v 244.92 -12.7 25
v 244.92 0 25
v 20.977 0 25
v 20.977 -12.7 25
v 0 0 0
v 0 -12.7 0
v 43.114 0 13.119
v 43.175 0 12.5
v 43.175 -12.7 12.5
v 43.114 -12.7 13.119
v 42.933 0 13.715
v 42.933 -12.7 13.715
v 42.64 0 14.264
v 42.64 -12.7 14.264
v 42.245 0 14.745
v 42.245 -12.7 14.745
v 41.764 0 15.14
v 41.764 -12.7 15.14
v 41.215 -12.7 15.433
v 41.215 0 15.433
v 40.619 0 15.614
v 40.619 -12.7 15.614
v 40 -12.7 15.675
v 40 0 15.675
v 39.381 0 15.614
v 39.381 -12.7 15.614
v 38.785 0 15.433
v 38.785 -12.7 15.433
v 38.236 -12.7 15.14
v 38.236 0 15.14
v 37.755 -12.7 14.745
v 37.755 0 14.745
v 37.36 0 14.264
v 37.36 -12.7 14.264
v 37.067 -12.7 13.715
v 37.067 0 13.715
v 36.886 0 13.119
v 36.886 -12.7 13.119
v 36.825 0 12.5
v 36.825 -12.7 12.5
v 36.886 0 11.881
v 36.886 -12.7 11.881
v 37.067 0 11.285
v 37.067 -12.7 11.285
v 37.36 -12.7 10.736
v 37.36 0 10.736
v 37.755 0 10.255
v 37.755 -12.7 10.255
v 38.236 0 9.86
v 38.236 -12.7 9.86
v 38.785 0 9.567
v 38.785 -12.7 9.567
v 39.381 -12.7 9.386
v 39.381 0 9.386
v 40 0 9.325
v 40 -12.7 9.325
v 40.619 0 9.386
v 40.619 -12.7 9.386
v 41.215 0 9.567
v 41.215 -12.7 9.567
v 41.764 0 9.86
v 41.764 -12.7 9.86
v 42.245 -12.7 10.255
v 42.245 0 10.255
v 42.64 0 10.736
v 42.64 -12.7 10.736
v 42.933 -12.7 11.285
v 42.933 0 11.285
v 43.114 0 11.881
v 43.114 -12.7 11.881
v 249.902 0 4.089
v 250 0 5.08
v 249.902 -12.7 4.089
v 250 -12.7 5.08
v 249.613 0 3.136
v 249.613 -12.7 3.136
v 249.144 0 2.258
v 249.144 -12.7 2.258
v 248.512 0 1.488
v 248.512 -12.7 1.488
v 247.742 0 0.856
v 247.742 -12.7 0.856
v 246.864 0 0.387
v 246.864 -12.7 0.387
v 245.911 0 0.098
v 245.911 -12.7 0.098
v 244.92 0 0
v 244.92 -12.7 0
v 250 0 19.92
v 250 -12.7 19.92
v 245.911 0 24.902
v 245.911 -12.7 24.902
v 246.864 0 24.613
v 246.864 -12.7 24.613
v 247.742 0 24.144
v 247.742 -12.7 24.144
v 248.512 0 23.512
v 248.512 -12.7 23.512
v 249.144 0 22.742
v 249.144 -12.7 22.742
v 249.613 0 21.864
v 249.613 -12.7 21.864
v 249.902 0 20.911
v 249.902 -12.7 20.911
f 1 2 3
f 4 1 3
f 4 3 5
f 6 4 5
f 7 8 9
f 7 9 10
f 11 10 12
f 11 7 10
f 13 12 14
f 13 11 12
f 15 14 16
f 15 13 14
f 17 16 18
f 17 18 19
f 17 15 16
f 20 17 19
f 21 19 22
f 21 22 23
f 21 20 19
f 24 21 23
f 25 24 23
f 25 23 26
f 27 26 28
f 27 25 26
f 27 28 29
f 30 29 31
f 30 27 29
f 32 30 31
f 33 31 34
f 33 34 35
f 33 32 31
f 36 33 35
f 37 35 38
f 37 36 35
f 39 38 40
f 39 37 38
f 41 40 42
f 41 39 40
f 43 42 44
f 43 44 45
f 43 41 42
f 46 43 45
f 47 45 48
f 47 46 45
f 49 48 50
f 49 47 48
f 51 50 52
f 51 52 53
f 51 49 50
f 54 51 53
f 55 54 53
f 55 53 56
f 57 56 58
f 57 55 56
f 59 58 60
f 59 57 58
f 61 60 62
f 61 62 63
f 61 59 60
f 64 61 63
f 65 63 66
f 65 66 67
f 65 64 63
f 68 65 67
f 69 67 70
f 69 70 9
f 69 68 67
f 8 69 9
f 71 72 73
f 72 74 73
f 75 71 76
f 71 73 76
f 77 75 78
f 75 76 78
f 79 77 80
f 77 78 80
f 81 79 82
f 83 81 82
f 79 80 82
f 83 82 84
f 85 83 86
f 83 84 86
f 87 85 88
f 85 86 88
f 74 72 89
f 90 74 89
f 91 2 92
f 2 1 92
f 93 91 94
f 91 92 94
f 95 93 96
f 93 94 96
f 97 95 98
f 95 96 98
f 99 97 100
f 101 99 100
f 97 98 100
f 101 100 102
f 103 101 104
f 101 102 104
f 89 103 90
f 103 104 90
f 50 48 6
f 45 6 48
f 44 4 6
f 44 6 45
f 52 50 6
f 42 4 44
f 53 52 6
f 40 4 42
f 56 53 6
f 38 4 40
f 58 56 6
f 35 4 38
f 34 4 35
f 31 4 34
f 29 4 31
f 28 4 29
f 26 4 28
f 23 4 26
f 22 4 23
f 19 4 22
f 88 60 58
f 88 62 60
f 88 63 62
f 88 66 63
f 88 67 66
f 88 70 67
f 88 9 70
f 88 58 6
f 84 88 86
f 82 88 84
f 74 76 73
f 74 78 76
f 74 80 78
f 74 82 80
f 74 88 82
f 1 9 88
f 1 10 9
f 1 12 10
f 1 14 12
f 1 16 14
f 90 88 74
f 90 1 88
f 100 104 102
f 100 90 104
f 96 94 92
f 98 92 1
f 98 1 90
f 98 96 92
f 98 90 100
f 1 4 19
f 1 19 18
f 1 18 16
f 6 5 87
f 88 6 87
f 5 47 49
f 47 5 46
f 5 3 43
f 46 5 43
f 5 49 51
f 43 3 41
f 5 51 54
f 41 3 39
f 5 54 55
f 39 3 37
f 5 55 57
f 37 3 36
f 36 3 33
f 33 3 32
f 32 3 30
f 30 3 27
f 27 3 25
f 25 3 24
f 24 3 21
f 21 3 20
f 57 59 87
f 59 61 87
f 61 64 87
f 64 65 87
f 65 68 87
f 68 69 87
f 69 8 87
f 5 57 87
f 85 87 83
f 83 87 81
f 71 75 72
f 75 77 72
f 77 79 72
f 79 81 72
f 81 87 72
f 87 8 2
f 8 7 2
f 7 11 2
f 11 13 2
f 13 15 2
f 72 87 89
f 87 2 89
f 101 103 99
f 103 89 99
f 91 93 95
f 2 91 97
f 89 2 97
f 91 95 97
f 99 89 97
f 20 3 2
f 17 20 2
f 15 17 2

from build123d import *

# Parameters (mm, degrees)
F0_R     = 3.175
F1_DEPTH = 12.7
F2_R     = 5.08
F3_R     = 5.08


with BuildPart() as f1:
    # F0 (on Front) → F1 (new body)
    with BuildSketch(Plane.XZ):
        Polygon((20.977491, 25), (0, 0), (250, 0), (250, 25), align=None)
        with Locations((40, 12.5)):
            Circle(F0_R, mode=Mode.SUBTRACT)
    extrude(amount=F1_DEPTH)

    # F2
    f2_edges = [f1.edges().sort_by_distance(p)[0] for p in [
        (250, -6.35, 25),
    ]]
    fillet(f2_edges, radius=F2_R)

    # F3
    f3_edges = [f1.edges().sort_by_distance(p)[0] for p in [
        (250, -6.35, 0),
    ]]
    fillet(f3_edges, radius=F3_R)


solid = f1.part
